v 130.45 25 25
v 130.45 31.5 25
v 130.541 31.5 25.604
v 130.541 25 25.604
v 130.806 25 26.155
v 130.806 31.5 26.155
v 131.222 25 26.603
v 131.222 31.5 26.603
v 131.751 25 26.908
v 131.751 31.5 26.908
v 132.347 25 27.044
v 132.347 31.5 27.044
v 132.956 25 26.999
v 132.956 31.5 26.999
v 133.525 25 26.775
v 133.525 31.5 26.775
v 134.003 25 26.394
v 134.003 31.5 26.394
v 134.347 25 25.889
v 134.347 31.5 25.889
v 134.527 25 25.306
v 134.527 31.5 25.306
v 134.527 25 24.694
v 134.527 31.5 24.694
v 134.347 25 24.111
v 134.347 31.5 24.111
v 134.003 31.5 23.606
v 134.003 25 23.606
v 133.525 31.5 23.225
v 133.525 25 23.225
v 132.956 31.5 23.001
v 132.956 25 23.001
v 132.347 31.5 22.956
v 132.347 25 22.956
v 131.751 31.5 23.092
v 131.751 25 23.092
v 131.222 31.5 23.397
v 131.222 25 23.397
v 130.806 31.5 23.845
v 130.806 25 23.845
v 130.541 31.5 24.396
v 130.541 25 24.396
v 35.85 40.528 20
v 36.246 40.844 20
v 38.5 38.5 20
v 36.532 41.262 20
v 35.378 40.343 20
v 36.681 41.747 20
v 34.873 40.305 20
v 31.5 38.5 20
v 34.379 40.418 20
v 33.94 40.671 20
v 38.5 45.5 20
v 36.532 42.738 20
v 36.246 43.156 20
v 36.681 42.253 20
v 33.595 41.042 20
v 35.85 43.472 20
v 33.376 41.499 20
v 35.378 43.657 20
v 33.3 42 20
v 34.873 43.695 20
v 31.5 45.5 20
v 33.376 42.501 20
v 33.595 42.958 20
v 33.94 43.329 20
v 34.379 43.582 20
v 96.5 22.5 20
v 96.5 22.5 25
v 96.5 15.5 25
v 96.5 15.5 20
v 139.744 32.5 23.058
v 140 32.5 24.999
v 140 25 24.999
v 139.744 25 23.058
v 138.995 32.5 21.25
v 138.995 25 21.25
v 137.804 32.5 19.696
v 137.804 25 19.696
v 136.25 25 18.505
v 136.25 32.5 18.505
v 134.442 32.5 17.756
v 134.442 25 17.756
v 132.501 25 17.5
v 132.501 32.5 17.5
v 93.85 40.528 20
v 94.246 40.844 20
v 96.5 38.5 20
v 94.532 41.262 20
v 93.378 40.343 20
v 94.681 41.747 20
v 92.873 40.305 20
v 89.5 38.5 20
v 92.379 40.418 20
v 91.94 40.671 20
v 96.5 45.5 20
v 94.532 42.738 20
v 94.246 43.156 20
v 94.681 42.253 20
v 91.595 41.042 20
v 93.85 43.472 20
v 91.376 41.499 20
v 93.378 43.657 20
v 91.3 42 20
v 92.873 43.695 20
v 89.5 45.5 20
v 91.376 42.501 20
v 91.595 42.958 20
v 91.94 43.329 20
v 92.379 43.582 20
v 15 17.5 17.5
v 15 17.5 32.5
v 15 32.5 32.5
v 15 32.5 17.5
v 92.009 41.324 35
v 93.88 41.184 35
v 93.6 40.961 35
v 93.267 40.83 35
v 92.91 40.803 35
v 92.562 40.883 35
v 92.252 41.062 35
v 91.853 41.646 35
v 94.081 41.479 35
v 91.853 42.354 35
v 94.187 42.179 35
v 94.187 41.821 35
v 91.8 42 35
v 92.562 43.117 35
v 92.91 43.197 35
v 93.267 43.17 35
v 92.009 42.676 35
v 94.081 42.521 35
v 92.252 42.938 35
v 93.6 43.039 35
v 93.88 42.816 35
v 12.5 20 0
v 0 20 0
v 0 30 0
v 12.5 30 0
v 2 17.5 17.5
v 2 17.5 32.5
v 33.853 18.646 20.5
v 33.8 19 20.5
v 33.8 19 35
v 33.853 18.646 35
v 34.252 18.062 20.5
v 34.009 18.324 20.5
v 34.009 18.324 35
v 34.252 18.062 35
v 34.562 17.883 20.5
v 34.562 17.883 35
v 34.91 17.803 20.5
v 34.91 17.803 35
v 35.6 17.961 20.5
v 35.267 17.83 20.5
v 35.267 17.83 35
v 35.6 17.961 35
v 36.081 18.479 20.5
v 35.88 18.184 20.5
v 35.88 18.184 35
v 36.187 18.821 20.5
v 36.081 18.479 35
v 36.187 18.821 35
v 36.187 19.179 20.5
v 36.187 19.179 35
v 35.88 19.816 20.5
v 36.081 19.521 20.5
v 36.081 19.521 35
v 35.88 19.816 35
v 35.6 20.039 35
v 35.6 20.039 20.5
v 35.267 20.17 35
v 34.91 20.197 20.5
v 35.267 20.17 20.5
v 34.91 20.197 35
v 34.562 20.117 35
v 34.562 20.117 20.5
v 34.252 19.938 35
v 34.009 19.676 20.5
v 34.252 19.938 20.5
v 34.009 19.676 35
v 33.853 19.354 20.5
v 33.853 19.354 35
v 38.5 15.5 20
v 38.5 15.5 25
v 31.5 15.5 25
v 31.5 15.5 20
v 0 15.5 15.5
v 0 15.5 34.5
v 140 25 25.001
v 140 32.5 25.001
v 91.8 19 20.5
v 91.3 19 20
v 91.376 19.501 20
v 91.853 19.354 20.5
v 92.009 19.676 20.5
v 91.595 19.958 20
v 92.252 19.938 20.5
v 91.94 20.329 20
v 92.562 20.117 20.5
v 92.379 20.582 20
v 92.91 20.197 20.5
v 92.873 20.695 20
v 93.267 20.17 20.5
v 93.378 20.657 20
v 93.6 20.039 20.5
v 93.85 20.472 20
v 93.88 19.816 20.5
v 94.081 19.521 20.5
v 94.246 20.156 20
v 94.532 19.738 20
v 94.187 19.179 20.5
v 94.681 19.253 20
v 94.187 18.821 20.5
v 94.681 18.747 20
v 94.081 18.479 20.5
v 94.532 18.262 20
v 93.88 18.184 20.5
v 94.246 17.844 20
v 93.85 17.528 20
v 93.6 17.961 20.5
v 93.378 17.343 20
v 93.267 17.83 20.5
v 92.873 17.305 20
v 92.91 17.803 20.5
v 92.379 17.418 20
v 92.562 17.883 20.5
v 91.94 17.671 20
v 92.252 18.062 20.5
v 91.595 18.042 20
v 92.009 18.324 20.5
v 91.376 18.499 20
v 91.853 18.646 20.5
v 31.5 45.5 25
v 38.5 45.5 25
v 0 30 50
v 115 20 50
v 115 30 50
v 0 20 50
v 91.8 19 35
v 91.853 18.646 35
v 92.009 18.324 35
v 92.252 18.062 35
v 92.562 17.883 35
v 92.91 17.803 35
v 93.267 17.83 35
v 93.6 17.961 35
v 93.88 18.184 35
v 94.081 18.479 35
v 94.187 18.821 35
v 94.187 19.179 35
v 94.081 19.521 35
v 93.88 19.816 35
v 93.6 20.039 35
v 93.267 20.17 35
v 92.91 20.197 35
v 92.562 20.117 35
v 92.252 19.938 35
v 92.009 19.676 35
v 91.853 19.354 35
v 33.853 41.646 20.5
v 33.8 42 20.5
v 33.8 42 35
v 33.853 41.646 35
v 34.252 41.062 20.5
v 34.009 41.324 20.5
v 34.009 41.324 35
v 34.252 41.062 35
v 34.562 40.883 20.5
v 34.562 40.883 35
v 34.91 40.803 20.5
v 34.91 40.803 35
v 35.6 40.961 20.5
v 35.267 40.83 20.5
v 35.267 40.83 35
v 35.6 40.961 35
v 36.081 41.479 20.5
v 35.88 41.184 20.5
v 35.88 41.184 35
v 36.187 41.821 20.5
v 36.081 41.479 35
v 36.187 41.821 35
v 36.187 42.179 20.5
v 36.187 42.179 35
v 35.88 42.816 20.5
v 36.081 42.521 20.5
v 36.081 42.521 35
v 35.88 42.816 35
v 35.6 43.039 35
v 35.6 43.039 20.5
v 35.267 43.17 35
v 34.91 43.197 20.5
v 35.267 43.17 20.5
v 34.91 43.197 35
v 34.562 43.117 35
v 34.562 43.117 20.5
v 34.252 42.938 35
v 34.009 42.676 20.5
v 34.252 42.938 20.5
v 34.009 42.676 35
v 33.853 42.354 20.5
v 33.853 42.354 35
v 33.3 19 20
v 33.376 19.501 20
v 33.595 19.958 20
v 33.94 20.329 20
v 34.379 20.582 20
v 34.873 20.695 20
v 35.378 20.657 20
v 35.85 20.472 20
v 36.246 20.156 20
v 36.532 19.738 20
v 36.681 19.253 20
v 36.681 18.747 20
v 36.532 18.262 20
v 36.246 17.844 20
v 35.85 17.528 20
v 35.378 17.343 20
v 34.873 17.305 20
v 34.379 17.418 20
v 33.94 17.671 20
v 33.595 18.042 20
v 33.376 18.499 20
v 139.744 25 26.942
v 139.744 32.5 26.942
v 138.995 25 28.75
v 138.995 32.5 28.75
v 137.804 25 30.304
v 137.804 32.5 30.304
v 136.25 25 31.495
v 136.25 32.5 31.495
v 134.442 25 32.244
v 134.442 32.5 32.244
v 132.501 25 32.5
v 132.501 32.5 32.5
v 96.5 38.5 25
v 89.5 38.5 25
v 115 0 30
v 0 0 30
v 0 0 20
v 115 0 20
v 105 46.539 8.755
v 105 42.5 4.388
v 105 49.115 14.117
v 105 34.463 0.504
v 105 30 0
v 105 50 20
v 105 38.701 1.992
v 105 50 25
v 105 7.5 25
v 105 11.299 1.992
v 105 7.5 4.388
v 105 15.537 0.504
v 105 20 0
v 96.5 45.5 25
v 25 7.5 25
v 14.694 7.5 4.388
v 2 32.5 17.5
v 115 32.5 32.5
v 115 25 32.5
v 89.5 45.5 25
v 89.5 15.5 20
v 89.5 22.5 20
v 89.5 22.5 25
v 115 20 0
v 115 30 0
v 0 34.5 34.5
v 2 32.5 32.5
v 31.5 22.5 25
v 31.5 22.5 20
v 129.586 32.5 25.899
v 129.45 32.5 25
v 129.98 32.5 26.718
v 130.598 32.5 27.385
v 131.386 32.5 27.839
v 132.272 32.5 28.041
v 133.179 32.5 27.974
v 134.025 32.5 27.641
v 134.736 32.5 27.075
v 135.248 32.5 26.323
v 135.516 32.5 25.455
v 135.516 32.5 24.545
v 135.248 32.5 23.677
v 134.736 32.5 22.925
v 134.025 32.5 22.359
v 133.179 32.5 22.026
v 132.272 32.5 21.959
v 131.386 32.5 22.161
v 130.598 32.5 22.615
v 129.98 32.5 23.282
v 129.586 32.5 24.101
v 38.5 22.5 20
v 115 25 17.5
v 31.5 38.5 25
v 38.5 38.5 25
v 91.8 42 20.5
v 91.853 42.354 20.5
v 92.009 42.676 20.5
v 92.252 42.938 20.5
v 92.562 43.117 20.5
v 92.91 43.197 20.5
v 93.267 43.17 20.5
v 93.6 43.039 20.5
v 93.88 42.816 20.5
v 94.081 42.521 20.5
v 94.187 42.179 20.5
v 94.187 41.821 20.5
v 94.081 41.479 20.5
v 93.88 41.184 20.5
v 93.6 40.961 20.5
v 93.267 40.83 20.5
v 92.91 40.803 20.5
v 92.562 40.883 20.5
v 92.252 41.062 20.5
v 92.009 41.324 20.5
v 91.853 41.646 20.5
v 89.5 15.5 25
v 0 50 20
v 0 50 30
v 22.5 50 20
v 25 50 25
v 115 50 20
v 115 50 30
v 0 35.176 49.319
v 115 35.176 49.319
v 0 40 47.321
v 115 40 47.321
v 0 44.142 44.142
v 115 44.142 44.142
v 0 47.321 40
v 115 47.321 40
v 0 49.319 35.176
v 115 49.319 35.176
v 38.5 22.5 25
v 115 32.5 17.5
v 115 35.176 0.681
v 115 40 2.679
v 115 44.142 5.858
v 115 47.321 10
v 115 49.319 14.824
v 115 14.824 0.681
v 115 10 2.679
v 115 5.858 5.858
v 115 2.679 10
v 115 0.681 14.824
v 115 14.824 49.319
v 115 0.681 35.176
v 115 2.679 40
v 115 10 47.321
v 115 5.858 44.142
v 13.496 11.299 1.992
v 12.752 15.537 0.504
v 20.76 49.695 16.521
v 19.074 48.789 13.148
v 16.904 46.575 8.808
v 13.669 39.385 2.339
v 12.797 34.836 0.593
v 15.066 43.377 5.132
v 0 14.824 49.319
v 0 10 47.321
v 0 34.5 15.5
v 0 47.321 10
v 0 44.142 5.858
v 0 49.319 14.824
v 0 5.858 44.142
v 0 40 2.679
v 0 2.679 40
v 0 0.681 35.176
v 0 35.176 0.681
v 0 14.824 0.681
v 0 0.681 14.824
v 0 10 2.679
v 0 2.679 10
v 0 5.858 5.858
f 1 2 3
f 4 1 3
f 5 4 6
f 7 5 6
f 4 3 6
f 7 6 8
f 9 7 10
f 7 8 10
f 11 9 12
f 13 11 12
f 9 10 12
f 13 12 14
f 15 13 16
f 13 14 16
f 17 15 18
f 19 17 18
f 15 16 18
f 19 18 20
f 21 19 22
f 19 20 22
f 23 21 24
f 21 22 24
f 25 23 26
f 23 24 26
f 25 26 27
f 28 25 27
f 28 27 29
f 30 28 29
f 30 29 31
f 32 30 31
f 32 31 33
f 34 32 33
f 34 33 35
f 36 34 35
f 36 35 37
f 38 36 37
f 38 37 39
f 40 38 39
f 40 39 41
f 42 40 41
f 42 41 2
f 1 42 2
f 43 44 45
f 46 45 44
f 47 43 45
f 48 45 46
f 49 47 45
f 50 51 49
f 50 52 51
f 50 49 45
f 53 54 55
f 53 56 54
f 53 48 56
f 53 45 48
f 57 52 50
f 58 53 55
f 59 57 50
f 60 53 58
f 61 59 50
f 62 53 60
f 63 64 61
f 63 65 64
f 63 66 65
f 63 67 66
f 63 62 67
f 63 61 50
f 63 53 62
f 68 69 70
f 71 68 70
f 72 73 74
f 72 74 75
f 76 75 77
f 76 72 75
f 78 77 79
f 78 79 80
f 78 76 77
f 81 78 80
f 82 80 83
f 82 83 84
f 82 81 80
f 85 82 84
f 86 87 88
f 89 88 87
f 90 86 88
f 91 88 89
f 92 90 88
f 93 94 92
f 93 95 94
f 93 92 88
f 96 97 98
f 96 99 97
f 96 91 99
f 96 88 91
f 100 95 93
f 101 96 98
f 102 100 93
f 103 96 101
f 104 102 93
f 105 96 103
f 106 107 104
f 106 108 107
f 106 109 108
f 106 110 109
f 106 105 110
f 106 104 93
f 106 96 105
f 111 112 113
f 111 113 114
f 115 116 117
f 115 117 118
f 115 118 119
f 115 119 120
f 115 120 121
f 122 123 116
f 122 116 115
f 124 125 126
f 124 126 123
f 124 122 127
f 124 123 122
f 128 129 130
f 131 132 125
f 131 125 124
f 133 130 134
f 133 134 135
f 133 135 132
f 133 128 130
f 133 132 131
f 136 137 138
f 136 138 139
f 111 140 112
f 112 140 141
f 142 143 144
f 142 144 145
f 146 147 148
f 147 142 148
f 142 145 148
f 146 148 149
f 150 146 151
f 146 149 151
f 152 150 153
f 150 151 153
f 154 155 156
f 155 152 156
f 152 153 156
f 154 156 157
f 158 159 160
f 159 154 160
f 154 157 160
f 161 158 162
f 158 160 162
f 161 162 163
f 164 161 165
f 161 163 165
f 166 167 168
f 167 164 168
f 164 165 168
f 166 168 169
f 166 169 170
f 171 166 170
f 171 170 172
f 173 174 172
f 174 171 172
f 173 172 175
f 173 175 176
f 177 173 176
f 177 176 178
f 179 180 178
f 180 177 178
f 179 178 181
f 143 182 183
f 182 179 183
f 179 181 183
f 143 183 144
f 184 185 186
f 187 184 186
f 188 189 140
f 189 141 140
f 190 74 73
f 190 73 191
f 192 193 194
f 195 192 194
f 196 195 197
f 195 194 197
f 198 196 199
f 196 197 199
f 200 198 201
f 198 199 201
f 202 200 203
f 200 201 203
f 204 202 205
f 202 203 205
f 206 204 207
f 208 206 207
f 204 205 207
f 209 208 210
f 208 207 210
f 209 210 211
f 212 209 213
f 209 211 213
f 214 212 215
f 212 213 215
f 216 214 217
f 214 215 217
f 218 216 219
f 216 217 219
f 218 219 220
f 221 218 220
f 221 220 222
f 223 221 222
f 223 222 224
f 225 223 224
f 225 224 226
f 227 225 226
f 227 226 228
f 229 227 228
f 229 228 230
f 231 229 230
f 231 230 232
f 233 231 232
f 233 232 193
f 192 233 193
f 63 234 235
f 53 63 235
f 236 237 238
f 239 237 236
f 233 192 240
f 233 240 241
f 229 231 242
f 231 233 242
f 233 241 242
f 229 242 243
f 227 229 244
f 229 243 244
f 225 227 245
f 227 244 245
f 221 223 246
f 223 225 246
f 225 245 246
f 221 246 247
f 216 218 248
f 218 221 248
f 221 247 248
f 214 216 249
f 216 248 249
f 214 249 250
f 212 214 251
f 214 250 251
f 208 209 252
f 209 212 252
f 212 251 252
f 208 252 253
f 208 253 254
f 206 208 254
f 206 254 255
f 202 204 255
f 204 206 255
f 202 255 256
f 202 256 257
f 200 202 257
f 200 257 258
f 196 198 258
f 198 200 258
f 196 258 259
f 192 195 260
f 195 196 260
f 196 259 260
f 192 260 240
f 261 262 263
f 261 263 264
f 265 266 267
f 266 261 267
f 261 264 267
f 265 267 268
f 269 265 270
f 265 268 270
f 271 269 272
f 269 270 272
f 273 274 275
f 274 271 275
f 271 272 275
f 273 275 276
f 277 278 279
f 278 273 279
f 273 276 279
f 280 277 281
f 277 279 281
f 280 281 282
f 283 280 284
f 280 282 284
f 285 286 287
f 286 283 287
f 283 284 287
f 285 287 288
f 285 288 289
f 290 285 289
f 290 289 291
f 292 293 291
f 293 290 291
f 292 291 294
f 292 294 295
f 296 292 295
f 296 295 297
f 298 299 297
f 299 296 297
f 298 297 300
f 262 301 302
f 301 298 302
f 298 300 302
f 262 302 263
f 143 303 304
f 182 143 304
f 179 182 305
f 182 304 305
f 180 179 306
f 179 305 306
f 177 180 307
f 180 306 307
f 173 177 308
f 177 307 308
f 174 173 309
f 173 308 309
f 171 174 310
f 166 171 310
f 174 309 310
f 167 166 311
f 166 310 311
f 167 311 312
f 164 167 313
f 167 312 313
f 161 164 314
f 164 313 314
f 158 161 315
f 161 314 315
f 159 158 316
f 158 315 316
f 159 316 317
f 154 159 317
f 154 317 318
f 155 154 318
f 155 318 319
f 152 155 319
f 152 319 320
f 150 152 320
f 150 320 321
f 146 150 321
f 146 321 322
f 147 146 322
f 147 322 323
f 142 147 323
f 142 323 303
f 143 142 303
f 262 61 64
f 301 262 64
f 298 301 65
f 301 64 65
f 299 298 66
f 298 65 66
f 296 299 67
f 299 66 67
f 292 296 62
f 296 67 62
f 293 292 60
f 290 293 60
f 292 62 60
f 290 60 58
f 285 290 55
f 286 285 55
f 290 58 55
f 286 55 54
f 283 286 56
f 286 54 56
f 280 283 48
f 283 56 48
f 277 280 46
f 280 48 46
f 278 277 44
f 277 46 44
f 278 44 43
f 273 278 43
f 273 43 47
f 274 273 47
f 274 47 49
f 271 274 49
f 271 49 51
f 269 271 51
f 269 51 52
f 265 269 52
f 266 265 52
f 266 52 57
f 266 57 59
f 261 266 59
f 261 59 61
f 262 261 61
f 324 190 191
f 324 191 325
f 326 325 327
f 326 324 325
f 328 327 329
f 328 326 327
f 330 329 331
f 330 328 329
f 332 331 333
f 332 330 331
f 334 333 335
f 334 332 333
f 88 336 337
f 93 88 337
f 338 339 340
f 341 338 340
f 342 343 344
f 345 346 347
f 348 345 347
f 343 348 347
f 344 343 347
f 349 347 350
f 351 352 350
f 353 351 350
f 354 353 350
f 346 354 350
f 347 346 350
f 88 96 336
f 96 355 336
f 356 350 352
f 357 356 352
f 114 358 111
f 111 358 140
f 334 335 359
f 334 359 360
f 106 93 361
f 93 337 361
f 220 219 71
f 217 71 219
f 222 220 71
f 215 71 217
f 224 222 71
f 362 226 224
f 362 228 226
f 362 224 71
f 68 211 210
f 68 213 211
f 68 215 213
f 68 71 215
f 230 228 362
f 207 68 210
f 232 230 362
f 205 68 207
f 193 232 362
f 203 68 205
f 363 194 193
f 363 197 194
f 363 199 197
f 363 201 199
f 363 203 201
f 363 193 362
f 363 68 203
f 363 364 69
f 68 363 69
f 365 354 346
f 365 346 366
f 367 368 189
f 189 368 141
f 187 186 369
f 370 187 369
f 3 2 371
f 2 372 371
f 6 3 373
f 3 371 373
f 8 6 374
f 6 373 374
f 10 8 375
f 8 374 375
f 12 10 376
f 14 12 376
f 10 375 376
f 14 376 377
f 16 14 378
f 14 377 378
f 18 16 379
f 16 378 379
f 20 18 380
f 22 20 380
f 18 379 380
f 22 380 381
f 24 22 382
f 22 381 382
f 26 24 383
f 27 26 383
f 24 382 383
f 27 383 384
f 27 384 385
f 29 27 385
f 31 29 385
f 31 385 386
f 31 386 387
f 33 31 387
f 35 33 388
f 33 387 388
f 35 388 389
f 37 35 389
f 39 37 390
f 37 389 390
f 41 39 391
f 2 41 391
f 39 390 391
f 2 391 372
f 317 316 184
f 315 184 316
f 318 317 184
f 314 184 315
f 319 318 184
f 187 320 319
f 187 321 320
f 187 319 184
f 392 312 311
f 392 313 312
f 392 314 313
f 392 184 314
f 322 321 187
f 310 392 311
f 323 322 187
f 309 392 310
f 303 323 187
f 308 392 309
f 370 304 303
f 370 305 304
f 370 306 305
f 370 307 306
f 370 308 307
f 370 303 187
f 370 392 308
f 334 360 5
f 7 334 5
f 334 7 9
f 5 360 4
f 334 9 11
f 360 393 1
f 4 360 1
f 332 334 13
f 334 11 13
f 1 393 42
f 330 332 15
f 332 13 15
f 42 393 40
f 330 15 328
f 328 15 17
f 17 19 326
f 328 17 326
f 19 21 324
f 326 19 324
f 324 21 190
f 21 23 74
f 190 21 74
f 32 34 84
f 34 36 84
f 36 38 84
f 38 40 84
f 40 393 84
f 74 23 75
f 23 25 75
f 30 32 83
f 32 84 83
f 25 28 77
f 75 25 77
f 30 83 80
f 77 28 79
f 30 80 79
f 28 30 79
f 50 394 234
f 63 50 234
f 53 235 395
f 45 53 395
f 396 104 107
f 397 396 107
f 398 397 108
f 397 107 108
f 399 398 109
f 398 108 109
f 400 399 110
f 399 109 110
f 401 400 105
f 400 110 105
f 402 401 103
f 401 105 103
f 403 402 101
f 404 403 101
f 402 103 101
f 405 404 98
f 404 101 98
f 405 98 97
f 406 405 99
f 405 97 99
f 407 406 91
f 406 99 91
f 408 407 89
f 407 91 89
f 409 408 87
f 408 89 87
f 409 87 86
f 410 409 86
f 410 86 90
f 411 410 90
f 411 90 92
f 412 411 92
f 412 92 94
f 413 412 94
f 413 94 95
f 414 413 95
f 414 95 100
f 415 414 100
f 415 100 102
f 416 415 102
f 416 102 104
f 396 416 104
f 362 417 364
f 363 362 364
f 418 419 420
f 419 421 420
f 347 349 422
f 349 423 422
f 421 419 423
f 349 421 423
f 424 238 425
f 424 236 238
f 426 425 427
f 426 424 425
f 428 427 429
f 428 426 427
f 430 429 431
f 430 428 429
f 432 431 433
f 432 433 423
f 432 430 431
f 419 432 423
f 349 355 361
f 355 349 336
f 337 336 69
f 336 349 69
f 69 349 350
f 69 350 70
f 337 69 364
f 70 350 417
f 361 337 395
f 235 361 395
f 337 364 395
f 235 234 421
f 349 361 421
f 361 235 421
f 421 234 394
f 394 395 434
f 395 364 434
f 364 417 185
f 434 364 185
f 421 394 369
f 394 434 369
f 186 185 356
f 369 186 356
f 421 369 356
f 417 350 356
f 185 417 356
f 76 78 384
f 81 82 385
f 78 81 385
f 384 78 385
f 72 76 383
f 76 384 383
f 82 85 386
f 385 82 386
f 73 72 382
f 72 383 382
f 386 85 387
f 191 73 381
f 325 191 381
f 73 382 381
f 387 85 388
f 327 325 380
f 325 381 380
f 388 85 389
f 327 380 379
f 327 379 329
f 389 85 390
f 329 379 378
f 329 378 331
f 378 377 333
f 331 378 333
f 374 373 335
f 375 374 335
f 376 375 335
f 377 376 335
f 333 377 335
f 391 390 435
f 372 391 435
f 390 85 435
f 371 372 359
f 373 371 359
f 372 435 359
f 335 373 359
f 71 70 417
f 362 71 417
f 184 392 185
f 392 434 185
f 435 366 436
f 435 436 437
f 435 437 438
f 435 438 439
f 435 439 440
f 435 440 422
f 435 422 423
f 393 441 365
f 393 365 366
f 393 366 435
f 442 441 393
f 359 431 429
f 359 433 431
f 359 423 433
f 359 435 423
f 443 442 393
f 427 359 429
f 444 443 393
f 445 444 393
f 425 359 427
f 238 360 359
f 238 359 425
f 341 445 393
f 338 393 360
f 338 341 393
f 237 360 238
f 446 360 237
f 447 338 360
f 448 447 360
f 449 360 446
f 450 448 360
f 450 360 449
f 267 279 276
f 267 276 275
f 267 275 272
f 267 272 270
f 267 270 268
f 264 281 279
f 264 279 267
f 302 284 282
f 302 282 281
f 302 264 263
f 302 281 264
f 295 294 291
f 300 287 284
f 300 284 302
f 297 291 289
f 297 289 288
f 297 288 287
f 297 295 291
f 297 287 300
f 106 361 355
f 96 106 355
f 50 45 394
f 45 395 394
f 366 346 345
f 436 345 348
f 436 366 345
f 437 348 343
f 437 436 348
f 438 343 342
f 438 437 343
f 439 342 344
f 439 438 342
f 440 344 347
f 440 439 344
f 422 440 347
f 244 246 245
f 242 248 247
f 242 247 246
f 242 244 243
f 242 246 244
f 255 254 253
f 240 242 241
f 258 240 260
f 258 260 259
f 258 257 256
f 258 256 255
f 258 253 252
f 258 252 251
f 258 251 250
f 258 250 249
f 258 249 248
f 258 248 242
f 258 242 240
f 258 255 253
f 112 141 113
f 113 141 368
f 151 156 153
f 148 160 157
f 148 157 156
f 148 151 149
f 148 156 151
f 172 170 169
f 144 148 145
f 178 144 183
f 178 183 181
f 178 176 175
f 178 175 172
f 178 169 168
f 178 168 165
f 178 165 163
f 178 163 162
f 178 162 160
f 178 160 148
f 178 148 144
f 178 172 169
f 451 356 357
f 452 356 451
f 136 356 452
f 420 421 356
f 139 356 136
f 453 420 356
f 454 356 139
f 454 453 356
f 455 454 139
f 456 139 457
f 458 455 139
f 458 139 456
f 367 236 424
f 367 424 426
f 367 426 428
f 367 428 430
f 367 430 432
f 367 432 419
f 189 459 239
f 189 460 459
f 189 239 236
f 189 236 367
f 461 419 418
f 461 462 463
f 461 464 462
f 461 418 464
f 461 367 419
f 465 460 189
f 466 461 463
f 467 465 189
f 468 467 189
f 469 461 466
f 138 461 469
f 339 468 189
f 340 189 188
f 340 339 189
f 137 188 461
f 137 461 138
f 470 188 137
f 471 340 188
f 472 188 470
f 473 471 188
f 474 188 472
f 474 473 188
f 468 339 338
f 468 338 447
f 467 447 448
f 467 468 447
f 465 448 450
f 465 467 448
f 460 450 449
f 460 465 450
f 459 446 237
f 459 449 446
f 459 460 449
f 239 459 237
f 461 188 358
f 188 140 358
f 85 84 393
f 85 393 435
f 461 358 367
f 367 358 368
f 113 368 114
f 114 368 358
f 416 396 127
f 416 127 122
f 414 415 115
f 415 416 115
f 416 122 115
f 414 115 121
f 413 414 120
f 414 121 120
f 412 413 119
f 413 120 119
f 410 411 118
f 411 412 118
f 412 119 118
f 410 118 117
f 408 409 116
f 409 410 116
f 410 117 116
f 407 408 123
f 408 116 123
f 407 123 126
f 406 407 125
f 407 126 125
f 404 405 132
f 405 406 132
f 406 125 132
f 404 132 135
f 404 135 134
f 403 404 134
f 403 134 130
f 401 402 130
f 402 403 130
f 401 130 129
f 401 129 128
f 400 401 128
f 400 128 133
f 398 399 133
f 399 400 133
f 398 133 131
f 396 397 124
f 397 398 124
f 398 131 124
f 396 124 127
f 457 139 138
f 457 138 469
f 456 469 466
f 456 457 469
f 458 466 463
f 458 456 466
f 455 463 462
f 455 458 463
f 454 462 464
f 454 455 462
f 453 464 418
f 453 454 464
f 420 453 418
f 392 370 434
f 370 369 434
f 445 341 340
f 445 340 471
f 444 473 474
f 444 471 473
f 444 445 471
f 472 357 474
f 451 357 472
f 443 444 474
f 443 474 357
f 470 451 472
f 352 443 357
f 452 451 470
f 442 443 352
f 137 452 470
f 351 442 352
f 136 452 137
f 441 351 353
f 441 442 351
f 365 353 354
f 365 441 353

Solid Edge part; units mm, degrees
sketch "Sketch1" plane through (0, 0, 0) normal (0, -1, 0) x (1, 0, 0)
  line L0 (0, 0) -> (115, 0)
  line L1 (115, 0) -> (115, 50)
  line L2 (115, 50) -> (0, 50)
  line L3 (0, 50) -> (0, 0)
  dimension "D1" = 50
  dimension "D2" = 50
  dimension "D3" = 115
extrude "Protrusion1" add sketch "Sketch1" against normal blind 50
fillet "Verrundung_2" radius 20 4 edges at (57.5, 50, 50) (57.5, 50, 0) (57.5, 0, 50) (57.5, 0, 0)
sketch "Sketch2" plane through (0, 25, 25) normal (-1, 0, 0) x (0, 0, -1)
  line L0 (-7.5, -7.5) -> (7.5, -7.5)
  line L1 (7.5, -7.5) -> (7.5, 7.5)
  line L2 (7.5, 7.5) -> (-7.5, 7.5)
  line L3 (-7.5, 7.5) -> (-7.5, -7.5)
  dimension "D1" = 15
extrude "Extrusionsausschnitt_5" cut sketch "Sketch2" against normal blind 15
chamfer "Fase_3" distance 2 angle 45 4 edges at (0, 25, 32.5) (0, 17.5, 25) (0, 25, 17.5) (0, 32.5, 25)
sketch "Sketch3" plane through (115, 25, 25) normal (1, 0, 0) x (0, 1, 0)
  line L0 (-7.5, -7.5) -> (7.5, -7.5)
  line L1 (7.5, -7.5) -> (7.5, 7.5)
  line L2 (7.5, 7.5) -> (-7.5, 7.5)
  line L3 (-7.5, 7.5) -> (-7.5, -7.5)
  dimension "D1" = 15
extrude "Extrusionsausprägung_2" add sketch "Sketch3" along normal blind 25
sketch "Sketch4" plane through (57.5, 25, 0) normal (0, 0, -1) x (-1, 0, 0)
  line L0 (-47.5, -17.5) -> (32.5, -17.5)
  line L1 (32.5, -17.5) -> (32.5, 17.5)
  line L2 (32.5, 17.5) -> (-47.5, 17.5)
  line L3 (-47.5, 17.5) -> (-47.5, -17.5)
  dimension "D1" = 35
  dimension "D2" = 80
  dimension "D3" = 10
extrude "Extrusionsausschnitt_6" cut sketch "Sketch4" against normal blind 20
sketch "Sketch5" plane through (65, 25, 20) normal (0, 0, -1) x (-1, 0, 0)
  line L0 (-40, 17.5) -> (40, 17.5)
  line L1 (40, 17.5) -> (40, -17.5)
  line L2 (40, -17.5) -> (-40, -17.5)
  line L3 (-40, -17.5) -> (-40, 17.5)
  line L4 (-34.5, 7) -> (-25.5, 7)
  line L5 (-25.5, 7) -> (-25.5, 16)
  line L6 (-25.5, 16) -> (-34.5, 16)
  line L7 (-34.5, 16) -> (-34.5, 7)
  line L8 (-34.5, -16) -> (-25.5, -16)
  line L9 (-25.5, -16) -> (-25.5, -7)
  line L10 (-25.5, -7) -> (-34.5, -7)
  line L11 (-34.5, -7) -> (-34.5, -16)
  line L12 (23.5, 7) -> (32.5, 7)
  line L13 (32.5, 7) -> (32.5, 16)
  line L14 (32.5, 16) -> (23.5, 16)
  line L15 (23.5, 16) -> (23.5, 7)
  line L16 (23.5, -16) -> (32.5, -16)
  line L17 (32.5, -16) -> (32.5, -7)
  line L18 (32.5, -7) -> (23.5, -7)
  line L19 (23.5, -7) -> (23.5, -16)
  dimension "D1" = 9
extrude "Extrusionsausschnitt_8" cut sketch "Sketch5" against normal blind 5
sketch "Sketch6" plane through (65, 42.5, 14.6938) normal (0, -1, 0) x (-1, 0, 0)
  line L0 (-40, -10.3062) -> (40, -10.3062)
  line L1 (40, -10.3062) -> (40, 10.3062)
  line L2 (40, 10.3062) -> (-40, 10.3062)
  line L3 (-40, 10.3062) -> (-40, -10.3062)
extrude "Extrusionsausschnitt_9" cut sketch "Sketch6" against normal blind 12
sketch "Sketch7" plane through (57.5, 50, 25) normal (0, 1, 0) x (-1, 0, 0)
  line L0 (32.5, 0) -> (45, -25)
  line L1 (45, -25) -> (32.5, -25)
  line L2 (32.5, -25) -> (32.5, 0)
extrude "Cutout1" cut sketch "Sketch7" against normal up to vertex (42.5 mm away)
fillet "Verrundung_3" radius 7.5 2 edges at (140, 25, 17.5) (140, 25, 32.5)
sketch "Sketch8" plane through (127.5, 32.5, 25) normal (0, 1, 0) x (-1, 0, 0)
  circle A0 centre (-5, 0) radius 2.05
  dimension "D1" = 4.1
extrude "Cutout2" cut sketch "Sketch8" against normal through all
chamfer "Fase_4" distance 1 angle 45 2 edges at (134.55, 32.5, 25) (132.5, 17.5, 22.95)
sketch "Sketch9" plane through (123.75, 25, 17.5) normal (0, 0, -1) x (-1, 0, 0)
  line L0 (8.75, -7.5) -> (8.75, 0)
  line L1 (8.75, 0) -> (-16.25, 0)
  line L2 (-16.25, 0) -> (-16.25, -7.5)
  line L3 (-16.25, -7.5) -> (8.75, -7.5)
extrude "Cutout3" cut sketch "Sketch9" against normal through all
sketch "Sketch10" plane through (95, 36.5, 20) normal (0, 0, -1) x (-1, 0, 0)
  line L0 (-4.5, 4.5) -> (62.5, 4.5)
  line L1 (62.5, 4.5) -> (62.5, -27.5)
  line L2 (62.5, -27.5) -> (-4.5, -27.5)
  line L3 (-4.5, -27.5) -> (-4.5, 4.5)
extrude "Cutout4" cut sketch "Sketch10" against normal up to vertex (5 mm away)
sketch "Sketch11" plane through (65, 28.75, 25) normal (0, 0, -1) x (-1, 0, 0)
  circle A0 centre (30, 13.25) radius 1.2
  circle A1 centre (-28, 13.25) radius 1.2
  circle A2 centre (-28, -9.75) radius 1.2
  circle A3 centre (30, -9.75) radius 1.2
  dimension "D1" = 2.4
  dimension "D2" = 58
  dimension "D3" = 23
  dimension "D4" = 10
  dimension "D5" = 8
extrude "Extrusionsausschnitt_14" cut sketch "Sketch11" against normal blind 10
sketch "Sketch12" plane through (65, 28.75, 25) normal (0, 0, -1) x (-1, 0, 0)
  line L0 (-31.5, 9.75) -> (-24.5, 9.75)
  line L1 (-24.5, 9.75) -> (-24.5, 16.75)
  line L2 (-24.5, 16.75) -> (-31.5, 16.75)
  line L3 (-31.5, 16.75) -> (-31.5, 9.75)
  line L4 (-31.5, -13.25) -> (-24.5, -13.25)
  line L5 (-24.5, -13.25) -> (-24.5, -6.25)
  line L6 (-24.5, -6.25) -> (-31.5, -6.25)
  line L7 (-31.5, -6.25) -> (-31.5, -13.25)
  line L8 (26.5, -13.25) -> (33.5, -13.25)
  line L9 (33.5, -13.25) -> (33.5, -6.25)
  line L10 (33.5, -6.25) -> (26.5, -6.25)
  line L11 (26.5, -6.25) -> (26.5, -13.25)
  line L12 (26.5, 9.75) -> (33.5, 9.75)
  line L13 (33.5, 9.75) -> (33.5, 16.75)
  line L14 (33.5, 16.75) -> (26.5, 16.75)
  line L15 (26.5, 16.75) -> (26.5, 9.75)
  circle A0 centre (-28, 13.25) radius 1.2
  circle A1 centre (-28, -9.75) radius 1.2
  circle A2 centre (30, -9.75) radius 1.2
  circle A3 centre (30, 13.25) radius 1.2
  dimension "D1" = 7
extrude "Extrusionsausprägung_3" add sketch "Sketch12" along normal blind 5
chamfer "Fase_5" distance 0.5 angle 45 4 edges at (94.2, 42, 20) (94.2, 19, 20) (36.2, 19, 20) (36.2, 42, 20)
properties part number "A6.A1.2" material "Nylon, allgemein"
